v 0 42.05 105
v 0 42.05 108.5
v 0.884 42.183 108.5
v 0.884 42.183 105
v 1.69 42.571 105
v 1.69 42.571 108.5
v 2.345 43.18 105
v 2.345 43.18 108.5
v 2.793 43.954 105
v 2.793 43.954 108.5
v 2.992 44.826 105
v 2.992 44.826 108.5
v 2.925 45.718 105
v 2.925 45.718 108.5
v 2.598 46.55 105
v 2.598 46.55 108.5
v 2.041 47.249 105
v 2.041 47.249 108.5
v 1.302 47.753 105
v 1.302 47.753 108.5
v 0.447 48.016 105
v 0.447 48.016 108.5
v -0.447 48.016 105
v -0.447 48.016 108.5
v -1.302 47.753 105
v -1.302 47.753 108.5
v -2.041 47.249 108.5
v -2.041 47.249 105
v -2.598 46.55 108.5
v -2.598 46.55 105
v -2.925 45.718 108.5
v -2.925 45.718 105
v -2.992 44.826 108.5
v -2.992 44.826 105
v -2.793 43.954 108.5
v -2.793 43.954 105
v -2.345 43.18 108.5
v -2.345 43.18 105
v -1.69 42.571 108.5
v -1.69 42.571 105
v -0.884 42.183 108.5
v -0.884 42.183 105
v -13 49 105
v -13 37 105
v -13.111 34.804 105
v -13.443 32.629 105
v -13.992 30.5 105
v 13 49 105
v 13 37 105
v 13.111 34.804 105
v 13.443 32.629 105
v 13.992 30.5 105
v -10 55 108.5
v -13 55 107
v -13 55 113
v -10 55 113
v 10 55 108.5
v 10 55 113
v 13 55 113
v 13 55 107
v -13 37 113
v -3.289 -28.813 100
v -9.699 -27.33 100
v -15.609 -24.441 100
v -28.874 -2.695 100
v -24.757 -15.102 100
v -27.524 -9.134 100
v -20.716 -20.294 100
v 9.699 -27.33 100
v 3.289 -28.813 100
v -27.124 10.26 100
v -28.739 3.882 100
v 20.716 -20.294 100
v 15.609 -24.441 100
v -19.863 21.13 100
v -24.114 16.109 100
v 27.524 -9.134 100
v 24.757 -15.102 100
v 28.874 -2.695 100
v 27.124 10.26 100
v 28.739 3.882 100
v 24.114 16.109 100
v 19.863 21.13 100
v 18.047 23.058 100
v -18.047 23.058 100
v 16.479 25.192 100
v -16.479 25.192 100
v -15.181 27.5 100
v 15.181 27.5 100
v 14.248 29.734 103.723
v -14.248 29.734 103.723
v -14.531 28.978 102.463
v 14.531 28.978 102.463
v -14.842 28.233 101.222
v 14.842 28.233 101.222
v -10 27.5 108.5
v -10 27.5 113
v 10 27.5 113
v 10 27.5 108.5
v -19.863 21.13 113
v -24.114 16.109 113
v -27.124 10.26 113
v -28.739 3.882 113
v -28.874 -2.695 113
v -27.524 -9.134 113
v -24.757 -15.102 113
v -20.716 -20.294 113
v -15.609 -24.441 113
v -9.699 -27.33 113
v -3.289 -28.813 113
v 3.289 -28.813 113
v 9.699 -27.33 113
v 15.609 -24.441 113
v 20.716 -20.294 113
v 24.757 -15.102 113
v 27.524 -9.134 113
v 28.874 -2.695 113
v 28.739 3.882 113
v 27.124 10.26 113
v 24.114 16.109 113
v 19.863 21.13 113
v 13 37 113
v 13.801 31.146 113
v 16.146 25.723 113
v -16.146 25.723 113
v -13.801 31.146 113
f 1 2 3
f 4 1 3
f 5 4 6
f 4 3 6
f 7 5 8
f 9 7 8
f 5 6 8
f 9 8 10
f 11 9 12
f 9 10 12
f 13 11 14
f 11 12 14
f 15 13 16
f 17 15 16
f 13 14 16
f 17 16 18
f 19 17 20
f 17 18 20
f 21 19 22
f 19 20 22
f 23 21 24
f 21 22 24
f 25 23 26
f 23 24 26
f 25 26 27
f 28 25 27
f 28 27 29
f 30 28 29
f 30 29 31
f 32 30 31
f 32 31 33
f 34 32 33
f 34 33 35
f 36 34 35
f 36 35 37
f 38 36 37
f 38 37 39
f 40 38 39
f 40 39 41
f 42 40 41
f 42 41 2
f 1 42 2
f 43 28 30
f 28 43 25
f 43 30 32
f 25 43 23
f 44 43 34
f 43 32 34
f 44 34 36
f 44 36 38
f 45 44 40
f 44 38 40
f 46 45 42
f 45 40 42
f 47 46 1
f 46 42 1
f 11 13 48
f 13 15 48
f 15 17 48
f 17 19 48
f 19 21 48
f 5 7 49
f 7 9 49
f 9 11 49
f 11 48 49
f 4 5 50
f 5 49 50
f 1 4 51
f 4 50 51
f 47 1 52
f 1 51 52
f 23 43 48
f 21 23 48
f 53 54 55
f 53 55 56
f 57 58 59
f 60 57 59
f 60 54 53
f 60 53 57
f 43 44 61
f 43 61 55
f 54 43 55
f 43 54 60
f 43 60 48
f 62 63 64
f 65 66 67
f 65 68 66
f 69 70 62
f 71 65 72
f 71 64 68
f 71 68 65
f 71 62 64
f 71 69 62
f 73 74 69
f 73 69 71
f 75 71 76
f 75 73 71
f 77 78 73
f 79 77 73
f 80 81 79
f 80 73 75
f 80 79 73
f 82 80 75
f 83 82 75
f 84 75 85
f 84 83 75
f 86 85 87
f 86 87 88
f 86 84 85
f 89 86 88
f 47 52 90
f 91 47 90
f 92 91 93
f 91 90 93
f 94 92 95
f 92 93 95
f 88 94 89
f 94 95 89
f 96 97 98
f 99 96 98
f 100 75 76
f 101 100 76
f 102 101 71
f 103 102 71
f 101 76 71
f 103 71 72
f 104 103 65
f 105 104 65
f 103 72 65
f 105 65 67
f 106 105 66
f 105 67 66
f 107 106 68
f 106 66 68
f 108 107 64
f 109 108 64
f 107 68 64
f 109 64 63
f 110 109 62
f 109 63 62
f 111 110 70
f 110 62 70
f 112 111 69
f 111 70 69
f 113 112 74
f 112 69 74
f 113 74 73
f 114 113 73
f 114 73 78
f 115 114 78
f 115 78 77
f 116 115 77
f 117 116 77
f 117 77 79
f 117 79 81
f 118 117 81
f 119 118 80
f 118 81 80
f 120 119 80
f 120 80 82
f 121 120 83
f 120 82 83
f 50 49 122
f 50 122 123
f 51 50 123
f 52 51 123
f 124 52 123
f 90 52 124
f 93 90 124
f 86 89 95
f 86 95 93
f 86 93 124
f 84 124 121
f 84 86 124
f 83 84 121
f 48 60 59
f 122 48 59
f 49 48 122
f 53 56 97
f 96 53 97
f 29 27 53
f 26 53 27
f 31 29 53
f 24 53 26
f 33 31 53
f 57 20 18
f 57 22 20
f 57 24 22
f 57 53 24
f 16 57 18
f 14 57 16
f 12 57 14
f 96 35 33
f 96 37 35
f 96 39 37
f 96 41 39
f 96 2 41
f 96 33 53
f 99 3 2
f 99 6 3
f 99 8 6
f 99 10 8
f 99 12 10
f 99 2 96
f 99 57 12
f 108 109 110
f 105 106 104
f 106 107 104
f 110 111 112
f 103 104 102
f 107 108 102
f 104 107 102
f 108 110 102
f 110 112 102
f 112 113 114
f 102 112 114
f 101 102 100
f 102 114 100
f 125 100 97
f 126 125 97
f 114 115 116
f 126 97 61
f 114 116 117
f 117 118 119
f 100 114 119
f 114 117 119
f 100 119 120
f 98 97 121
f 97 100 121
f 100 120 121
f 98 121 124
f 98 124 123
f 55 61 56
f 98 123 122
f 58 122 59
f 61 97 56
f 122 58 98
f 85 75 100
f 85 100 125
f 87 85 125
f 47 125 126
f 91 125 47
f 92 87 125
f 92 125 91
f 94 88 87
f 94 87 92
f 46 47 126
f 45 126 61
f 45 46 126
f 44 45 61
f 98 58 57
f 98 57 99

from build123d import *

# Parameters (mm, degrees)
PAD001_DEPTH         = 13
SKETCH004_W          = 27.5
SKETCH004_H          = 20
POCKET_DEPTH         = 4.5
SKETCH005_R          = 3
HOLE_DEPTH           = 25
POCKET001_DEPTH      = 42.001
POCKET001_DEPTH_BACK = 16.001


with BuildPart() as part:
    # Sketch003 (on CopyRevolution) → Pad001 (new body)
    with BuildSketch(Plane(origin=(0, 0, 100), x_dir=(0, -1, 0), z_dir=(0, 0, 1))):
        with BuildLine():
            Line((-55, -13), (-55, 13))
            Line((-55, 13), (-37, 13))
            ThreePointArc((-37, 13), (-28.354779, 14.789176), (-21.129846, 19.862769))
            ThreePointArc((-21.129846, -19.862769), (29, 0), (-21.129846, 19.862769))
            ThreePointArc((-21.129846, -19.862769), (-28.354779, -14.789176), (-37, -13))
            Line((-37, -13), (-55, -13))
        make_face()
    extrude(amount=PAD001_DEPTH)

    # Sketch004 (on Face8 of Pad001) → Pocket (cut)
    with BuildSketch(Plane(origin=(0, 0, 113), x_dir=(0, -1, 0), z_dir=(0, 0, 1))):
        with Locations((-41.25, 0)):
            Rectangle(SKETCH004_W, SKETCH004_H)
    extrude(amount=-POCKET_DEPTH, mode=Mode.SUBTRACT)

    # Sketch005 (on Face12 of Pocket) → Hole (cut)
    with BuildSketch(Plane(origin=(0, 0, 108.5), x_dir=(0, -1, 0), z_dir=(0, 0, 1))):
        with Locations((-45.05, 0)):
            Circle(SKETCH005_R)
    extrude(amount=-HOLE_DEPTH, mode=Mode.SUBTRACT)

    # Sketch006 (on Face8 of Hole) → Pocket001 (cut, two sides)
    with BuildSketch(Plane.YZ.offset(13)) as pocket001_sk:
        Polygon((55, 107), (49, 105), (30.5, 105), (27.5, 100), (55, 100), align=None)
    extrude(amount=-POCKET001_DEPTH, mode=Mode.SUBTRACT)
    extrude(pocket001_sk.sketch, amount=POCKET001_DEPTH_BACK, mode=Mode.SUBTRACT)


solid = part.part
